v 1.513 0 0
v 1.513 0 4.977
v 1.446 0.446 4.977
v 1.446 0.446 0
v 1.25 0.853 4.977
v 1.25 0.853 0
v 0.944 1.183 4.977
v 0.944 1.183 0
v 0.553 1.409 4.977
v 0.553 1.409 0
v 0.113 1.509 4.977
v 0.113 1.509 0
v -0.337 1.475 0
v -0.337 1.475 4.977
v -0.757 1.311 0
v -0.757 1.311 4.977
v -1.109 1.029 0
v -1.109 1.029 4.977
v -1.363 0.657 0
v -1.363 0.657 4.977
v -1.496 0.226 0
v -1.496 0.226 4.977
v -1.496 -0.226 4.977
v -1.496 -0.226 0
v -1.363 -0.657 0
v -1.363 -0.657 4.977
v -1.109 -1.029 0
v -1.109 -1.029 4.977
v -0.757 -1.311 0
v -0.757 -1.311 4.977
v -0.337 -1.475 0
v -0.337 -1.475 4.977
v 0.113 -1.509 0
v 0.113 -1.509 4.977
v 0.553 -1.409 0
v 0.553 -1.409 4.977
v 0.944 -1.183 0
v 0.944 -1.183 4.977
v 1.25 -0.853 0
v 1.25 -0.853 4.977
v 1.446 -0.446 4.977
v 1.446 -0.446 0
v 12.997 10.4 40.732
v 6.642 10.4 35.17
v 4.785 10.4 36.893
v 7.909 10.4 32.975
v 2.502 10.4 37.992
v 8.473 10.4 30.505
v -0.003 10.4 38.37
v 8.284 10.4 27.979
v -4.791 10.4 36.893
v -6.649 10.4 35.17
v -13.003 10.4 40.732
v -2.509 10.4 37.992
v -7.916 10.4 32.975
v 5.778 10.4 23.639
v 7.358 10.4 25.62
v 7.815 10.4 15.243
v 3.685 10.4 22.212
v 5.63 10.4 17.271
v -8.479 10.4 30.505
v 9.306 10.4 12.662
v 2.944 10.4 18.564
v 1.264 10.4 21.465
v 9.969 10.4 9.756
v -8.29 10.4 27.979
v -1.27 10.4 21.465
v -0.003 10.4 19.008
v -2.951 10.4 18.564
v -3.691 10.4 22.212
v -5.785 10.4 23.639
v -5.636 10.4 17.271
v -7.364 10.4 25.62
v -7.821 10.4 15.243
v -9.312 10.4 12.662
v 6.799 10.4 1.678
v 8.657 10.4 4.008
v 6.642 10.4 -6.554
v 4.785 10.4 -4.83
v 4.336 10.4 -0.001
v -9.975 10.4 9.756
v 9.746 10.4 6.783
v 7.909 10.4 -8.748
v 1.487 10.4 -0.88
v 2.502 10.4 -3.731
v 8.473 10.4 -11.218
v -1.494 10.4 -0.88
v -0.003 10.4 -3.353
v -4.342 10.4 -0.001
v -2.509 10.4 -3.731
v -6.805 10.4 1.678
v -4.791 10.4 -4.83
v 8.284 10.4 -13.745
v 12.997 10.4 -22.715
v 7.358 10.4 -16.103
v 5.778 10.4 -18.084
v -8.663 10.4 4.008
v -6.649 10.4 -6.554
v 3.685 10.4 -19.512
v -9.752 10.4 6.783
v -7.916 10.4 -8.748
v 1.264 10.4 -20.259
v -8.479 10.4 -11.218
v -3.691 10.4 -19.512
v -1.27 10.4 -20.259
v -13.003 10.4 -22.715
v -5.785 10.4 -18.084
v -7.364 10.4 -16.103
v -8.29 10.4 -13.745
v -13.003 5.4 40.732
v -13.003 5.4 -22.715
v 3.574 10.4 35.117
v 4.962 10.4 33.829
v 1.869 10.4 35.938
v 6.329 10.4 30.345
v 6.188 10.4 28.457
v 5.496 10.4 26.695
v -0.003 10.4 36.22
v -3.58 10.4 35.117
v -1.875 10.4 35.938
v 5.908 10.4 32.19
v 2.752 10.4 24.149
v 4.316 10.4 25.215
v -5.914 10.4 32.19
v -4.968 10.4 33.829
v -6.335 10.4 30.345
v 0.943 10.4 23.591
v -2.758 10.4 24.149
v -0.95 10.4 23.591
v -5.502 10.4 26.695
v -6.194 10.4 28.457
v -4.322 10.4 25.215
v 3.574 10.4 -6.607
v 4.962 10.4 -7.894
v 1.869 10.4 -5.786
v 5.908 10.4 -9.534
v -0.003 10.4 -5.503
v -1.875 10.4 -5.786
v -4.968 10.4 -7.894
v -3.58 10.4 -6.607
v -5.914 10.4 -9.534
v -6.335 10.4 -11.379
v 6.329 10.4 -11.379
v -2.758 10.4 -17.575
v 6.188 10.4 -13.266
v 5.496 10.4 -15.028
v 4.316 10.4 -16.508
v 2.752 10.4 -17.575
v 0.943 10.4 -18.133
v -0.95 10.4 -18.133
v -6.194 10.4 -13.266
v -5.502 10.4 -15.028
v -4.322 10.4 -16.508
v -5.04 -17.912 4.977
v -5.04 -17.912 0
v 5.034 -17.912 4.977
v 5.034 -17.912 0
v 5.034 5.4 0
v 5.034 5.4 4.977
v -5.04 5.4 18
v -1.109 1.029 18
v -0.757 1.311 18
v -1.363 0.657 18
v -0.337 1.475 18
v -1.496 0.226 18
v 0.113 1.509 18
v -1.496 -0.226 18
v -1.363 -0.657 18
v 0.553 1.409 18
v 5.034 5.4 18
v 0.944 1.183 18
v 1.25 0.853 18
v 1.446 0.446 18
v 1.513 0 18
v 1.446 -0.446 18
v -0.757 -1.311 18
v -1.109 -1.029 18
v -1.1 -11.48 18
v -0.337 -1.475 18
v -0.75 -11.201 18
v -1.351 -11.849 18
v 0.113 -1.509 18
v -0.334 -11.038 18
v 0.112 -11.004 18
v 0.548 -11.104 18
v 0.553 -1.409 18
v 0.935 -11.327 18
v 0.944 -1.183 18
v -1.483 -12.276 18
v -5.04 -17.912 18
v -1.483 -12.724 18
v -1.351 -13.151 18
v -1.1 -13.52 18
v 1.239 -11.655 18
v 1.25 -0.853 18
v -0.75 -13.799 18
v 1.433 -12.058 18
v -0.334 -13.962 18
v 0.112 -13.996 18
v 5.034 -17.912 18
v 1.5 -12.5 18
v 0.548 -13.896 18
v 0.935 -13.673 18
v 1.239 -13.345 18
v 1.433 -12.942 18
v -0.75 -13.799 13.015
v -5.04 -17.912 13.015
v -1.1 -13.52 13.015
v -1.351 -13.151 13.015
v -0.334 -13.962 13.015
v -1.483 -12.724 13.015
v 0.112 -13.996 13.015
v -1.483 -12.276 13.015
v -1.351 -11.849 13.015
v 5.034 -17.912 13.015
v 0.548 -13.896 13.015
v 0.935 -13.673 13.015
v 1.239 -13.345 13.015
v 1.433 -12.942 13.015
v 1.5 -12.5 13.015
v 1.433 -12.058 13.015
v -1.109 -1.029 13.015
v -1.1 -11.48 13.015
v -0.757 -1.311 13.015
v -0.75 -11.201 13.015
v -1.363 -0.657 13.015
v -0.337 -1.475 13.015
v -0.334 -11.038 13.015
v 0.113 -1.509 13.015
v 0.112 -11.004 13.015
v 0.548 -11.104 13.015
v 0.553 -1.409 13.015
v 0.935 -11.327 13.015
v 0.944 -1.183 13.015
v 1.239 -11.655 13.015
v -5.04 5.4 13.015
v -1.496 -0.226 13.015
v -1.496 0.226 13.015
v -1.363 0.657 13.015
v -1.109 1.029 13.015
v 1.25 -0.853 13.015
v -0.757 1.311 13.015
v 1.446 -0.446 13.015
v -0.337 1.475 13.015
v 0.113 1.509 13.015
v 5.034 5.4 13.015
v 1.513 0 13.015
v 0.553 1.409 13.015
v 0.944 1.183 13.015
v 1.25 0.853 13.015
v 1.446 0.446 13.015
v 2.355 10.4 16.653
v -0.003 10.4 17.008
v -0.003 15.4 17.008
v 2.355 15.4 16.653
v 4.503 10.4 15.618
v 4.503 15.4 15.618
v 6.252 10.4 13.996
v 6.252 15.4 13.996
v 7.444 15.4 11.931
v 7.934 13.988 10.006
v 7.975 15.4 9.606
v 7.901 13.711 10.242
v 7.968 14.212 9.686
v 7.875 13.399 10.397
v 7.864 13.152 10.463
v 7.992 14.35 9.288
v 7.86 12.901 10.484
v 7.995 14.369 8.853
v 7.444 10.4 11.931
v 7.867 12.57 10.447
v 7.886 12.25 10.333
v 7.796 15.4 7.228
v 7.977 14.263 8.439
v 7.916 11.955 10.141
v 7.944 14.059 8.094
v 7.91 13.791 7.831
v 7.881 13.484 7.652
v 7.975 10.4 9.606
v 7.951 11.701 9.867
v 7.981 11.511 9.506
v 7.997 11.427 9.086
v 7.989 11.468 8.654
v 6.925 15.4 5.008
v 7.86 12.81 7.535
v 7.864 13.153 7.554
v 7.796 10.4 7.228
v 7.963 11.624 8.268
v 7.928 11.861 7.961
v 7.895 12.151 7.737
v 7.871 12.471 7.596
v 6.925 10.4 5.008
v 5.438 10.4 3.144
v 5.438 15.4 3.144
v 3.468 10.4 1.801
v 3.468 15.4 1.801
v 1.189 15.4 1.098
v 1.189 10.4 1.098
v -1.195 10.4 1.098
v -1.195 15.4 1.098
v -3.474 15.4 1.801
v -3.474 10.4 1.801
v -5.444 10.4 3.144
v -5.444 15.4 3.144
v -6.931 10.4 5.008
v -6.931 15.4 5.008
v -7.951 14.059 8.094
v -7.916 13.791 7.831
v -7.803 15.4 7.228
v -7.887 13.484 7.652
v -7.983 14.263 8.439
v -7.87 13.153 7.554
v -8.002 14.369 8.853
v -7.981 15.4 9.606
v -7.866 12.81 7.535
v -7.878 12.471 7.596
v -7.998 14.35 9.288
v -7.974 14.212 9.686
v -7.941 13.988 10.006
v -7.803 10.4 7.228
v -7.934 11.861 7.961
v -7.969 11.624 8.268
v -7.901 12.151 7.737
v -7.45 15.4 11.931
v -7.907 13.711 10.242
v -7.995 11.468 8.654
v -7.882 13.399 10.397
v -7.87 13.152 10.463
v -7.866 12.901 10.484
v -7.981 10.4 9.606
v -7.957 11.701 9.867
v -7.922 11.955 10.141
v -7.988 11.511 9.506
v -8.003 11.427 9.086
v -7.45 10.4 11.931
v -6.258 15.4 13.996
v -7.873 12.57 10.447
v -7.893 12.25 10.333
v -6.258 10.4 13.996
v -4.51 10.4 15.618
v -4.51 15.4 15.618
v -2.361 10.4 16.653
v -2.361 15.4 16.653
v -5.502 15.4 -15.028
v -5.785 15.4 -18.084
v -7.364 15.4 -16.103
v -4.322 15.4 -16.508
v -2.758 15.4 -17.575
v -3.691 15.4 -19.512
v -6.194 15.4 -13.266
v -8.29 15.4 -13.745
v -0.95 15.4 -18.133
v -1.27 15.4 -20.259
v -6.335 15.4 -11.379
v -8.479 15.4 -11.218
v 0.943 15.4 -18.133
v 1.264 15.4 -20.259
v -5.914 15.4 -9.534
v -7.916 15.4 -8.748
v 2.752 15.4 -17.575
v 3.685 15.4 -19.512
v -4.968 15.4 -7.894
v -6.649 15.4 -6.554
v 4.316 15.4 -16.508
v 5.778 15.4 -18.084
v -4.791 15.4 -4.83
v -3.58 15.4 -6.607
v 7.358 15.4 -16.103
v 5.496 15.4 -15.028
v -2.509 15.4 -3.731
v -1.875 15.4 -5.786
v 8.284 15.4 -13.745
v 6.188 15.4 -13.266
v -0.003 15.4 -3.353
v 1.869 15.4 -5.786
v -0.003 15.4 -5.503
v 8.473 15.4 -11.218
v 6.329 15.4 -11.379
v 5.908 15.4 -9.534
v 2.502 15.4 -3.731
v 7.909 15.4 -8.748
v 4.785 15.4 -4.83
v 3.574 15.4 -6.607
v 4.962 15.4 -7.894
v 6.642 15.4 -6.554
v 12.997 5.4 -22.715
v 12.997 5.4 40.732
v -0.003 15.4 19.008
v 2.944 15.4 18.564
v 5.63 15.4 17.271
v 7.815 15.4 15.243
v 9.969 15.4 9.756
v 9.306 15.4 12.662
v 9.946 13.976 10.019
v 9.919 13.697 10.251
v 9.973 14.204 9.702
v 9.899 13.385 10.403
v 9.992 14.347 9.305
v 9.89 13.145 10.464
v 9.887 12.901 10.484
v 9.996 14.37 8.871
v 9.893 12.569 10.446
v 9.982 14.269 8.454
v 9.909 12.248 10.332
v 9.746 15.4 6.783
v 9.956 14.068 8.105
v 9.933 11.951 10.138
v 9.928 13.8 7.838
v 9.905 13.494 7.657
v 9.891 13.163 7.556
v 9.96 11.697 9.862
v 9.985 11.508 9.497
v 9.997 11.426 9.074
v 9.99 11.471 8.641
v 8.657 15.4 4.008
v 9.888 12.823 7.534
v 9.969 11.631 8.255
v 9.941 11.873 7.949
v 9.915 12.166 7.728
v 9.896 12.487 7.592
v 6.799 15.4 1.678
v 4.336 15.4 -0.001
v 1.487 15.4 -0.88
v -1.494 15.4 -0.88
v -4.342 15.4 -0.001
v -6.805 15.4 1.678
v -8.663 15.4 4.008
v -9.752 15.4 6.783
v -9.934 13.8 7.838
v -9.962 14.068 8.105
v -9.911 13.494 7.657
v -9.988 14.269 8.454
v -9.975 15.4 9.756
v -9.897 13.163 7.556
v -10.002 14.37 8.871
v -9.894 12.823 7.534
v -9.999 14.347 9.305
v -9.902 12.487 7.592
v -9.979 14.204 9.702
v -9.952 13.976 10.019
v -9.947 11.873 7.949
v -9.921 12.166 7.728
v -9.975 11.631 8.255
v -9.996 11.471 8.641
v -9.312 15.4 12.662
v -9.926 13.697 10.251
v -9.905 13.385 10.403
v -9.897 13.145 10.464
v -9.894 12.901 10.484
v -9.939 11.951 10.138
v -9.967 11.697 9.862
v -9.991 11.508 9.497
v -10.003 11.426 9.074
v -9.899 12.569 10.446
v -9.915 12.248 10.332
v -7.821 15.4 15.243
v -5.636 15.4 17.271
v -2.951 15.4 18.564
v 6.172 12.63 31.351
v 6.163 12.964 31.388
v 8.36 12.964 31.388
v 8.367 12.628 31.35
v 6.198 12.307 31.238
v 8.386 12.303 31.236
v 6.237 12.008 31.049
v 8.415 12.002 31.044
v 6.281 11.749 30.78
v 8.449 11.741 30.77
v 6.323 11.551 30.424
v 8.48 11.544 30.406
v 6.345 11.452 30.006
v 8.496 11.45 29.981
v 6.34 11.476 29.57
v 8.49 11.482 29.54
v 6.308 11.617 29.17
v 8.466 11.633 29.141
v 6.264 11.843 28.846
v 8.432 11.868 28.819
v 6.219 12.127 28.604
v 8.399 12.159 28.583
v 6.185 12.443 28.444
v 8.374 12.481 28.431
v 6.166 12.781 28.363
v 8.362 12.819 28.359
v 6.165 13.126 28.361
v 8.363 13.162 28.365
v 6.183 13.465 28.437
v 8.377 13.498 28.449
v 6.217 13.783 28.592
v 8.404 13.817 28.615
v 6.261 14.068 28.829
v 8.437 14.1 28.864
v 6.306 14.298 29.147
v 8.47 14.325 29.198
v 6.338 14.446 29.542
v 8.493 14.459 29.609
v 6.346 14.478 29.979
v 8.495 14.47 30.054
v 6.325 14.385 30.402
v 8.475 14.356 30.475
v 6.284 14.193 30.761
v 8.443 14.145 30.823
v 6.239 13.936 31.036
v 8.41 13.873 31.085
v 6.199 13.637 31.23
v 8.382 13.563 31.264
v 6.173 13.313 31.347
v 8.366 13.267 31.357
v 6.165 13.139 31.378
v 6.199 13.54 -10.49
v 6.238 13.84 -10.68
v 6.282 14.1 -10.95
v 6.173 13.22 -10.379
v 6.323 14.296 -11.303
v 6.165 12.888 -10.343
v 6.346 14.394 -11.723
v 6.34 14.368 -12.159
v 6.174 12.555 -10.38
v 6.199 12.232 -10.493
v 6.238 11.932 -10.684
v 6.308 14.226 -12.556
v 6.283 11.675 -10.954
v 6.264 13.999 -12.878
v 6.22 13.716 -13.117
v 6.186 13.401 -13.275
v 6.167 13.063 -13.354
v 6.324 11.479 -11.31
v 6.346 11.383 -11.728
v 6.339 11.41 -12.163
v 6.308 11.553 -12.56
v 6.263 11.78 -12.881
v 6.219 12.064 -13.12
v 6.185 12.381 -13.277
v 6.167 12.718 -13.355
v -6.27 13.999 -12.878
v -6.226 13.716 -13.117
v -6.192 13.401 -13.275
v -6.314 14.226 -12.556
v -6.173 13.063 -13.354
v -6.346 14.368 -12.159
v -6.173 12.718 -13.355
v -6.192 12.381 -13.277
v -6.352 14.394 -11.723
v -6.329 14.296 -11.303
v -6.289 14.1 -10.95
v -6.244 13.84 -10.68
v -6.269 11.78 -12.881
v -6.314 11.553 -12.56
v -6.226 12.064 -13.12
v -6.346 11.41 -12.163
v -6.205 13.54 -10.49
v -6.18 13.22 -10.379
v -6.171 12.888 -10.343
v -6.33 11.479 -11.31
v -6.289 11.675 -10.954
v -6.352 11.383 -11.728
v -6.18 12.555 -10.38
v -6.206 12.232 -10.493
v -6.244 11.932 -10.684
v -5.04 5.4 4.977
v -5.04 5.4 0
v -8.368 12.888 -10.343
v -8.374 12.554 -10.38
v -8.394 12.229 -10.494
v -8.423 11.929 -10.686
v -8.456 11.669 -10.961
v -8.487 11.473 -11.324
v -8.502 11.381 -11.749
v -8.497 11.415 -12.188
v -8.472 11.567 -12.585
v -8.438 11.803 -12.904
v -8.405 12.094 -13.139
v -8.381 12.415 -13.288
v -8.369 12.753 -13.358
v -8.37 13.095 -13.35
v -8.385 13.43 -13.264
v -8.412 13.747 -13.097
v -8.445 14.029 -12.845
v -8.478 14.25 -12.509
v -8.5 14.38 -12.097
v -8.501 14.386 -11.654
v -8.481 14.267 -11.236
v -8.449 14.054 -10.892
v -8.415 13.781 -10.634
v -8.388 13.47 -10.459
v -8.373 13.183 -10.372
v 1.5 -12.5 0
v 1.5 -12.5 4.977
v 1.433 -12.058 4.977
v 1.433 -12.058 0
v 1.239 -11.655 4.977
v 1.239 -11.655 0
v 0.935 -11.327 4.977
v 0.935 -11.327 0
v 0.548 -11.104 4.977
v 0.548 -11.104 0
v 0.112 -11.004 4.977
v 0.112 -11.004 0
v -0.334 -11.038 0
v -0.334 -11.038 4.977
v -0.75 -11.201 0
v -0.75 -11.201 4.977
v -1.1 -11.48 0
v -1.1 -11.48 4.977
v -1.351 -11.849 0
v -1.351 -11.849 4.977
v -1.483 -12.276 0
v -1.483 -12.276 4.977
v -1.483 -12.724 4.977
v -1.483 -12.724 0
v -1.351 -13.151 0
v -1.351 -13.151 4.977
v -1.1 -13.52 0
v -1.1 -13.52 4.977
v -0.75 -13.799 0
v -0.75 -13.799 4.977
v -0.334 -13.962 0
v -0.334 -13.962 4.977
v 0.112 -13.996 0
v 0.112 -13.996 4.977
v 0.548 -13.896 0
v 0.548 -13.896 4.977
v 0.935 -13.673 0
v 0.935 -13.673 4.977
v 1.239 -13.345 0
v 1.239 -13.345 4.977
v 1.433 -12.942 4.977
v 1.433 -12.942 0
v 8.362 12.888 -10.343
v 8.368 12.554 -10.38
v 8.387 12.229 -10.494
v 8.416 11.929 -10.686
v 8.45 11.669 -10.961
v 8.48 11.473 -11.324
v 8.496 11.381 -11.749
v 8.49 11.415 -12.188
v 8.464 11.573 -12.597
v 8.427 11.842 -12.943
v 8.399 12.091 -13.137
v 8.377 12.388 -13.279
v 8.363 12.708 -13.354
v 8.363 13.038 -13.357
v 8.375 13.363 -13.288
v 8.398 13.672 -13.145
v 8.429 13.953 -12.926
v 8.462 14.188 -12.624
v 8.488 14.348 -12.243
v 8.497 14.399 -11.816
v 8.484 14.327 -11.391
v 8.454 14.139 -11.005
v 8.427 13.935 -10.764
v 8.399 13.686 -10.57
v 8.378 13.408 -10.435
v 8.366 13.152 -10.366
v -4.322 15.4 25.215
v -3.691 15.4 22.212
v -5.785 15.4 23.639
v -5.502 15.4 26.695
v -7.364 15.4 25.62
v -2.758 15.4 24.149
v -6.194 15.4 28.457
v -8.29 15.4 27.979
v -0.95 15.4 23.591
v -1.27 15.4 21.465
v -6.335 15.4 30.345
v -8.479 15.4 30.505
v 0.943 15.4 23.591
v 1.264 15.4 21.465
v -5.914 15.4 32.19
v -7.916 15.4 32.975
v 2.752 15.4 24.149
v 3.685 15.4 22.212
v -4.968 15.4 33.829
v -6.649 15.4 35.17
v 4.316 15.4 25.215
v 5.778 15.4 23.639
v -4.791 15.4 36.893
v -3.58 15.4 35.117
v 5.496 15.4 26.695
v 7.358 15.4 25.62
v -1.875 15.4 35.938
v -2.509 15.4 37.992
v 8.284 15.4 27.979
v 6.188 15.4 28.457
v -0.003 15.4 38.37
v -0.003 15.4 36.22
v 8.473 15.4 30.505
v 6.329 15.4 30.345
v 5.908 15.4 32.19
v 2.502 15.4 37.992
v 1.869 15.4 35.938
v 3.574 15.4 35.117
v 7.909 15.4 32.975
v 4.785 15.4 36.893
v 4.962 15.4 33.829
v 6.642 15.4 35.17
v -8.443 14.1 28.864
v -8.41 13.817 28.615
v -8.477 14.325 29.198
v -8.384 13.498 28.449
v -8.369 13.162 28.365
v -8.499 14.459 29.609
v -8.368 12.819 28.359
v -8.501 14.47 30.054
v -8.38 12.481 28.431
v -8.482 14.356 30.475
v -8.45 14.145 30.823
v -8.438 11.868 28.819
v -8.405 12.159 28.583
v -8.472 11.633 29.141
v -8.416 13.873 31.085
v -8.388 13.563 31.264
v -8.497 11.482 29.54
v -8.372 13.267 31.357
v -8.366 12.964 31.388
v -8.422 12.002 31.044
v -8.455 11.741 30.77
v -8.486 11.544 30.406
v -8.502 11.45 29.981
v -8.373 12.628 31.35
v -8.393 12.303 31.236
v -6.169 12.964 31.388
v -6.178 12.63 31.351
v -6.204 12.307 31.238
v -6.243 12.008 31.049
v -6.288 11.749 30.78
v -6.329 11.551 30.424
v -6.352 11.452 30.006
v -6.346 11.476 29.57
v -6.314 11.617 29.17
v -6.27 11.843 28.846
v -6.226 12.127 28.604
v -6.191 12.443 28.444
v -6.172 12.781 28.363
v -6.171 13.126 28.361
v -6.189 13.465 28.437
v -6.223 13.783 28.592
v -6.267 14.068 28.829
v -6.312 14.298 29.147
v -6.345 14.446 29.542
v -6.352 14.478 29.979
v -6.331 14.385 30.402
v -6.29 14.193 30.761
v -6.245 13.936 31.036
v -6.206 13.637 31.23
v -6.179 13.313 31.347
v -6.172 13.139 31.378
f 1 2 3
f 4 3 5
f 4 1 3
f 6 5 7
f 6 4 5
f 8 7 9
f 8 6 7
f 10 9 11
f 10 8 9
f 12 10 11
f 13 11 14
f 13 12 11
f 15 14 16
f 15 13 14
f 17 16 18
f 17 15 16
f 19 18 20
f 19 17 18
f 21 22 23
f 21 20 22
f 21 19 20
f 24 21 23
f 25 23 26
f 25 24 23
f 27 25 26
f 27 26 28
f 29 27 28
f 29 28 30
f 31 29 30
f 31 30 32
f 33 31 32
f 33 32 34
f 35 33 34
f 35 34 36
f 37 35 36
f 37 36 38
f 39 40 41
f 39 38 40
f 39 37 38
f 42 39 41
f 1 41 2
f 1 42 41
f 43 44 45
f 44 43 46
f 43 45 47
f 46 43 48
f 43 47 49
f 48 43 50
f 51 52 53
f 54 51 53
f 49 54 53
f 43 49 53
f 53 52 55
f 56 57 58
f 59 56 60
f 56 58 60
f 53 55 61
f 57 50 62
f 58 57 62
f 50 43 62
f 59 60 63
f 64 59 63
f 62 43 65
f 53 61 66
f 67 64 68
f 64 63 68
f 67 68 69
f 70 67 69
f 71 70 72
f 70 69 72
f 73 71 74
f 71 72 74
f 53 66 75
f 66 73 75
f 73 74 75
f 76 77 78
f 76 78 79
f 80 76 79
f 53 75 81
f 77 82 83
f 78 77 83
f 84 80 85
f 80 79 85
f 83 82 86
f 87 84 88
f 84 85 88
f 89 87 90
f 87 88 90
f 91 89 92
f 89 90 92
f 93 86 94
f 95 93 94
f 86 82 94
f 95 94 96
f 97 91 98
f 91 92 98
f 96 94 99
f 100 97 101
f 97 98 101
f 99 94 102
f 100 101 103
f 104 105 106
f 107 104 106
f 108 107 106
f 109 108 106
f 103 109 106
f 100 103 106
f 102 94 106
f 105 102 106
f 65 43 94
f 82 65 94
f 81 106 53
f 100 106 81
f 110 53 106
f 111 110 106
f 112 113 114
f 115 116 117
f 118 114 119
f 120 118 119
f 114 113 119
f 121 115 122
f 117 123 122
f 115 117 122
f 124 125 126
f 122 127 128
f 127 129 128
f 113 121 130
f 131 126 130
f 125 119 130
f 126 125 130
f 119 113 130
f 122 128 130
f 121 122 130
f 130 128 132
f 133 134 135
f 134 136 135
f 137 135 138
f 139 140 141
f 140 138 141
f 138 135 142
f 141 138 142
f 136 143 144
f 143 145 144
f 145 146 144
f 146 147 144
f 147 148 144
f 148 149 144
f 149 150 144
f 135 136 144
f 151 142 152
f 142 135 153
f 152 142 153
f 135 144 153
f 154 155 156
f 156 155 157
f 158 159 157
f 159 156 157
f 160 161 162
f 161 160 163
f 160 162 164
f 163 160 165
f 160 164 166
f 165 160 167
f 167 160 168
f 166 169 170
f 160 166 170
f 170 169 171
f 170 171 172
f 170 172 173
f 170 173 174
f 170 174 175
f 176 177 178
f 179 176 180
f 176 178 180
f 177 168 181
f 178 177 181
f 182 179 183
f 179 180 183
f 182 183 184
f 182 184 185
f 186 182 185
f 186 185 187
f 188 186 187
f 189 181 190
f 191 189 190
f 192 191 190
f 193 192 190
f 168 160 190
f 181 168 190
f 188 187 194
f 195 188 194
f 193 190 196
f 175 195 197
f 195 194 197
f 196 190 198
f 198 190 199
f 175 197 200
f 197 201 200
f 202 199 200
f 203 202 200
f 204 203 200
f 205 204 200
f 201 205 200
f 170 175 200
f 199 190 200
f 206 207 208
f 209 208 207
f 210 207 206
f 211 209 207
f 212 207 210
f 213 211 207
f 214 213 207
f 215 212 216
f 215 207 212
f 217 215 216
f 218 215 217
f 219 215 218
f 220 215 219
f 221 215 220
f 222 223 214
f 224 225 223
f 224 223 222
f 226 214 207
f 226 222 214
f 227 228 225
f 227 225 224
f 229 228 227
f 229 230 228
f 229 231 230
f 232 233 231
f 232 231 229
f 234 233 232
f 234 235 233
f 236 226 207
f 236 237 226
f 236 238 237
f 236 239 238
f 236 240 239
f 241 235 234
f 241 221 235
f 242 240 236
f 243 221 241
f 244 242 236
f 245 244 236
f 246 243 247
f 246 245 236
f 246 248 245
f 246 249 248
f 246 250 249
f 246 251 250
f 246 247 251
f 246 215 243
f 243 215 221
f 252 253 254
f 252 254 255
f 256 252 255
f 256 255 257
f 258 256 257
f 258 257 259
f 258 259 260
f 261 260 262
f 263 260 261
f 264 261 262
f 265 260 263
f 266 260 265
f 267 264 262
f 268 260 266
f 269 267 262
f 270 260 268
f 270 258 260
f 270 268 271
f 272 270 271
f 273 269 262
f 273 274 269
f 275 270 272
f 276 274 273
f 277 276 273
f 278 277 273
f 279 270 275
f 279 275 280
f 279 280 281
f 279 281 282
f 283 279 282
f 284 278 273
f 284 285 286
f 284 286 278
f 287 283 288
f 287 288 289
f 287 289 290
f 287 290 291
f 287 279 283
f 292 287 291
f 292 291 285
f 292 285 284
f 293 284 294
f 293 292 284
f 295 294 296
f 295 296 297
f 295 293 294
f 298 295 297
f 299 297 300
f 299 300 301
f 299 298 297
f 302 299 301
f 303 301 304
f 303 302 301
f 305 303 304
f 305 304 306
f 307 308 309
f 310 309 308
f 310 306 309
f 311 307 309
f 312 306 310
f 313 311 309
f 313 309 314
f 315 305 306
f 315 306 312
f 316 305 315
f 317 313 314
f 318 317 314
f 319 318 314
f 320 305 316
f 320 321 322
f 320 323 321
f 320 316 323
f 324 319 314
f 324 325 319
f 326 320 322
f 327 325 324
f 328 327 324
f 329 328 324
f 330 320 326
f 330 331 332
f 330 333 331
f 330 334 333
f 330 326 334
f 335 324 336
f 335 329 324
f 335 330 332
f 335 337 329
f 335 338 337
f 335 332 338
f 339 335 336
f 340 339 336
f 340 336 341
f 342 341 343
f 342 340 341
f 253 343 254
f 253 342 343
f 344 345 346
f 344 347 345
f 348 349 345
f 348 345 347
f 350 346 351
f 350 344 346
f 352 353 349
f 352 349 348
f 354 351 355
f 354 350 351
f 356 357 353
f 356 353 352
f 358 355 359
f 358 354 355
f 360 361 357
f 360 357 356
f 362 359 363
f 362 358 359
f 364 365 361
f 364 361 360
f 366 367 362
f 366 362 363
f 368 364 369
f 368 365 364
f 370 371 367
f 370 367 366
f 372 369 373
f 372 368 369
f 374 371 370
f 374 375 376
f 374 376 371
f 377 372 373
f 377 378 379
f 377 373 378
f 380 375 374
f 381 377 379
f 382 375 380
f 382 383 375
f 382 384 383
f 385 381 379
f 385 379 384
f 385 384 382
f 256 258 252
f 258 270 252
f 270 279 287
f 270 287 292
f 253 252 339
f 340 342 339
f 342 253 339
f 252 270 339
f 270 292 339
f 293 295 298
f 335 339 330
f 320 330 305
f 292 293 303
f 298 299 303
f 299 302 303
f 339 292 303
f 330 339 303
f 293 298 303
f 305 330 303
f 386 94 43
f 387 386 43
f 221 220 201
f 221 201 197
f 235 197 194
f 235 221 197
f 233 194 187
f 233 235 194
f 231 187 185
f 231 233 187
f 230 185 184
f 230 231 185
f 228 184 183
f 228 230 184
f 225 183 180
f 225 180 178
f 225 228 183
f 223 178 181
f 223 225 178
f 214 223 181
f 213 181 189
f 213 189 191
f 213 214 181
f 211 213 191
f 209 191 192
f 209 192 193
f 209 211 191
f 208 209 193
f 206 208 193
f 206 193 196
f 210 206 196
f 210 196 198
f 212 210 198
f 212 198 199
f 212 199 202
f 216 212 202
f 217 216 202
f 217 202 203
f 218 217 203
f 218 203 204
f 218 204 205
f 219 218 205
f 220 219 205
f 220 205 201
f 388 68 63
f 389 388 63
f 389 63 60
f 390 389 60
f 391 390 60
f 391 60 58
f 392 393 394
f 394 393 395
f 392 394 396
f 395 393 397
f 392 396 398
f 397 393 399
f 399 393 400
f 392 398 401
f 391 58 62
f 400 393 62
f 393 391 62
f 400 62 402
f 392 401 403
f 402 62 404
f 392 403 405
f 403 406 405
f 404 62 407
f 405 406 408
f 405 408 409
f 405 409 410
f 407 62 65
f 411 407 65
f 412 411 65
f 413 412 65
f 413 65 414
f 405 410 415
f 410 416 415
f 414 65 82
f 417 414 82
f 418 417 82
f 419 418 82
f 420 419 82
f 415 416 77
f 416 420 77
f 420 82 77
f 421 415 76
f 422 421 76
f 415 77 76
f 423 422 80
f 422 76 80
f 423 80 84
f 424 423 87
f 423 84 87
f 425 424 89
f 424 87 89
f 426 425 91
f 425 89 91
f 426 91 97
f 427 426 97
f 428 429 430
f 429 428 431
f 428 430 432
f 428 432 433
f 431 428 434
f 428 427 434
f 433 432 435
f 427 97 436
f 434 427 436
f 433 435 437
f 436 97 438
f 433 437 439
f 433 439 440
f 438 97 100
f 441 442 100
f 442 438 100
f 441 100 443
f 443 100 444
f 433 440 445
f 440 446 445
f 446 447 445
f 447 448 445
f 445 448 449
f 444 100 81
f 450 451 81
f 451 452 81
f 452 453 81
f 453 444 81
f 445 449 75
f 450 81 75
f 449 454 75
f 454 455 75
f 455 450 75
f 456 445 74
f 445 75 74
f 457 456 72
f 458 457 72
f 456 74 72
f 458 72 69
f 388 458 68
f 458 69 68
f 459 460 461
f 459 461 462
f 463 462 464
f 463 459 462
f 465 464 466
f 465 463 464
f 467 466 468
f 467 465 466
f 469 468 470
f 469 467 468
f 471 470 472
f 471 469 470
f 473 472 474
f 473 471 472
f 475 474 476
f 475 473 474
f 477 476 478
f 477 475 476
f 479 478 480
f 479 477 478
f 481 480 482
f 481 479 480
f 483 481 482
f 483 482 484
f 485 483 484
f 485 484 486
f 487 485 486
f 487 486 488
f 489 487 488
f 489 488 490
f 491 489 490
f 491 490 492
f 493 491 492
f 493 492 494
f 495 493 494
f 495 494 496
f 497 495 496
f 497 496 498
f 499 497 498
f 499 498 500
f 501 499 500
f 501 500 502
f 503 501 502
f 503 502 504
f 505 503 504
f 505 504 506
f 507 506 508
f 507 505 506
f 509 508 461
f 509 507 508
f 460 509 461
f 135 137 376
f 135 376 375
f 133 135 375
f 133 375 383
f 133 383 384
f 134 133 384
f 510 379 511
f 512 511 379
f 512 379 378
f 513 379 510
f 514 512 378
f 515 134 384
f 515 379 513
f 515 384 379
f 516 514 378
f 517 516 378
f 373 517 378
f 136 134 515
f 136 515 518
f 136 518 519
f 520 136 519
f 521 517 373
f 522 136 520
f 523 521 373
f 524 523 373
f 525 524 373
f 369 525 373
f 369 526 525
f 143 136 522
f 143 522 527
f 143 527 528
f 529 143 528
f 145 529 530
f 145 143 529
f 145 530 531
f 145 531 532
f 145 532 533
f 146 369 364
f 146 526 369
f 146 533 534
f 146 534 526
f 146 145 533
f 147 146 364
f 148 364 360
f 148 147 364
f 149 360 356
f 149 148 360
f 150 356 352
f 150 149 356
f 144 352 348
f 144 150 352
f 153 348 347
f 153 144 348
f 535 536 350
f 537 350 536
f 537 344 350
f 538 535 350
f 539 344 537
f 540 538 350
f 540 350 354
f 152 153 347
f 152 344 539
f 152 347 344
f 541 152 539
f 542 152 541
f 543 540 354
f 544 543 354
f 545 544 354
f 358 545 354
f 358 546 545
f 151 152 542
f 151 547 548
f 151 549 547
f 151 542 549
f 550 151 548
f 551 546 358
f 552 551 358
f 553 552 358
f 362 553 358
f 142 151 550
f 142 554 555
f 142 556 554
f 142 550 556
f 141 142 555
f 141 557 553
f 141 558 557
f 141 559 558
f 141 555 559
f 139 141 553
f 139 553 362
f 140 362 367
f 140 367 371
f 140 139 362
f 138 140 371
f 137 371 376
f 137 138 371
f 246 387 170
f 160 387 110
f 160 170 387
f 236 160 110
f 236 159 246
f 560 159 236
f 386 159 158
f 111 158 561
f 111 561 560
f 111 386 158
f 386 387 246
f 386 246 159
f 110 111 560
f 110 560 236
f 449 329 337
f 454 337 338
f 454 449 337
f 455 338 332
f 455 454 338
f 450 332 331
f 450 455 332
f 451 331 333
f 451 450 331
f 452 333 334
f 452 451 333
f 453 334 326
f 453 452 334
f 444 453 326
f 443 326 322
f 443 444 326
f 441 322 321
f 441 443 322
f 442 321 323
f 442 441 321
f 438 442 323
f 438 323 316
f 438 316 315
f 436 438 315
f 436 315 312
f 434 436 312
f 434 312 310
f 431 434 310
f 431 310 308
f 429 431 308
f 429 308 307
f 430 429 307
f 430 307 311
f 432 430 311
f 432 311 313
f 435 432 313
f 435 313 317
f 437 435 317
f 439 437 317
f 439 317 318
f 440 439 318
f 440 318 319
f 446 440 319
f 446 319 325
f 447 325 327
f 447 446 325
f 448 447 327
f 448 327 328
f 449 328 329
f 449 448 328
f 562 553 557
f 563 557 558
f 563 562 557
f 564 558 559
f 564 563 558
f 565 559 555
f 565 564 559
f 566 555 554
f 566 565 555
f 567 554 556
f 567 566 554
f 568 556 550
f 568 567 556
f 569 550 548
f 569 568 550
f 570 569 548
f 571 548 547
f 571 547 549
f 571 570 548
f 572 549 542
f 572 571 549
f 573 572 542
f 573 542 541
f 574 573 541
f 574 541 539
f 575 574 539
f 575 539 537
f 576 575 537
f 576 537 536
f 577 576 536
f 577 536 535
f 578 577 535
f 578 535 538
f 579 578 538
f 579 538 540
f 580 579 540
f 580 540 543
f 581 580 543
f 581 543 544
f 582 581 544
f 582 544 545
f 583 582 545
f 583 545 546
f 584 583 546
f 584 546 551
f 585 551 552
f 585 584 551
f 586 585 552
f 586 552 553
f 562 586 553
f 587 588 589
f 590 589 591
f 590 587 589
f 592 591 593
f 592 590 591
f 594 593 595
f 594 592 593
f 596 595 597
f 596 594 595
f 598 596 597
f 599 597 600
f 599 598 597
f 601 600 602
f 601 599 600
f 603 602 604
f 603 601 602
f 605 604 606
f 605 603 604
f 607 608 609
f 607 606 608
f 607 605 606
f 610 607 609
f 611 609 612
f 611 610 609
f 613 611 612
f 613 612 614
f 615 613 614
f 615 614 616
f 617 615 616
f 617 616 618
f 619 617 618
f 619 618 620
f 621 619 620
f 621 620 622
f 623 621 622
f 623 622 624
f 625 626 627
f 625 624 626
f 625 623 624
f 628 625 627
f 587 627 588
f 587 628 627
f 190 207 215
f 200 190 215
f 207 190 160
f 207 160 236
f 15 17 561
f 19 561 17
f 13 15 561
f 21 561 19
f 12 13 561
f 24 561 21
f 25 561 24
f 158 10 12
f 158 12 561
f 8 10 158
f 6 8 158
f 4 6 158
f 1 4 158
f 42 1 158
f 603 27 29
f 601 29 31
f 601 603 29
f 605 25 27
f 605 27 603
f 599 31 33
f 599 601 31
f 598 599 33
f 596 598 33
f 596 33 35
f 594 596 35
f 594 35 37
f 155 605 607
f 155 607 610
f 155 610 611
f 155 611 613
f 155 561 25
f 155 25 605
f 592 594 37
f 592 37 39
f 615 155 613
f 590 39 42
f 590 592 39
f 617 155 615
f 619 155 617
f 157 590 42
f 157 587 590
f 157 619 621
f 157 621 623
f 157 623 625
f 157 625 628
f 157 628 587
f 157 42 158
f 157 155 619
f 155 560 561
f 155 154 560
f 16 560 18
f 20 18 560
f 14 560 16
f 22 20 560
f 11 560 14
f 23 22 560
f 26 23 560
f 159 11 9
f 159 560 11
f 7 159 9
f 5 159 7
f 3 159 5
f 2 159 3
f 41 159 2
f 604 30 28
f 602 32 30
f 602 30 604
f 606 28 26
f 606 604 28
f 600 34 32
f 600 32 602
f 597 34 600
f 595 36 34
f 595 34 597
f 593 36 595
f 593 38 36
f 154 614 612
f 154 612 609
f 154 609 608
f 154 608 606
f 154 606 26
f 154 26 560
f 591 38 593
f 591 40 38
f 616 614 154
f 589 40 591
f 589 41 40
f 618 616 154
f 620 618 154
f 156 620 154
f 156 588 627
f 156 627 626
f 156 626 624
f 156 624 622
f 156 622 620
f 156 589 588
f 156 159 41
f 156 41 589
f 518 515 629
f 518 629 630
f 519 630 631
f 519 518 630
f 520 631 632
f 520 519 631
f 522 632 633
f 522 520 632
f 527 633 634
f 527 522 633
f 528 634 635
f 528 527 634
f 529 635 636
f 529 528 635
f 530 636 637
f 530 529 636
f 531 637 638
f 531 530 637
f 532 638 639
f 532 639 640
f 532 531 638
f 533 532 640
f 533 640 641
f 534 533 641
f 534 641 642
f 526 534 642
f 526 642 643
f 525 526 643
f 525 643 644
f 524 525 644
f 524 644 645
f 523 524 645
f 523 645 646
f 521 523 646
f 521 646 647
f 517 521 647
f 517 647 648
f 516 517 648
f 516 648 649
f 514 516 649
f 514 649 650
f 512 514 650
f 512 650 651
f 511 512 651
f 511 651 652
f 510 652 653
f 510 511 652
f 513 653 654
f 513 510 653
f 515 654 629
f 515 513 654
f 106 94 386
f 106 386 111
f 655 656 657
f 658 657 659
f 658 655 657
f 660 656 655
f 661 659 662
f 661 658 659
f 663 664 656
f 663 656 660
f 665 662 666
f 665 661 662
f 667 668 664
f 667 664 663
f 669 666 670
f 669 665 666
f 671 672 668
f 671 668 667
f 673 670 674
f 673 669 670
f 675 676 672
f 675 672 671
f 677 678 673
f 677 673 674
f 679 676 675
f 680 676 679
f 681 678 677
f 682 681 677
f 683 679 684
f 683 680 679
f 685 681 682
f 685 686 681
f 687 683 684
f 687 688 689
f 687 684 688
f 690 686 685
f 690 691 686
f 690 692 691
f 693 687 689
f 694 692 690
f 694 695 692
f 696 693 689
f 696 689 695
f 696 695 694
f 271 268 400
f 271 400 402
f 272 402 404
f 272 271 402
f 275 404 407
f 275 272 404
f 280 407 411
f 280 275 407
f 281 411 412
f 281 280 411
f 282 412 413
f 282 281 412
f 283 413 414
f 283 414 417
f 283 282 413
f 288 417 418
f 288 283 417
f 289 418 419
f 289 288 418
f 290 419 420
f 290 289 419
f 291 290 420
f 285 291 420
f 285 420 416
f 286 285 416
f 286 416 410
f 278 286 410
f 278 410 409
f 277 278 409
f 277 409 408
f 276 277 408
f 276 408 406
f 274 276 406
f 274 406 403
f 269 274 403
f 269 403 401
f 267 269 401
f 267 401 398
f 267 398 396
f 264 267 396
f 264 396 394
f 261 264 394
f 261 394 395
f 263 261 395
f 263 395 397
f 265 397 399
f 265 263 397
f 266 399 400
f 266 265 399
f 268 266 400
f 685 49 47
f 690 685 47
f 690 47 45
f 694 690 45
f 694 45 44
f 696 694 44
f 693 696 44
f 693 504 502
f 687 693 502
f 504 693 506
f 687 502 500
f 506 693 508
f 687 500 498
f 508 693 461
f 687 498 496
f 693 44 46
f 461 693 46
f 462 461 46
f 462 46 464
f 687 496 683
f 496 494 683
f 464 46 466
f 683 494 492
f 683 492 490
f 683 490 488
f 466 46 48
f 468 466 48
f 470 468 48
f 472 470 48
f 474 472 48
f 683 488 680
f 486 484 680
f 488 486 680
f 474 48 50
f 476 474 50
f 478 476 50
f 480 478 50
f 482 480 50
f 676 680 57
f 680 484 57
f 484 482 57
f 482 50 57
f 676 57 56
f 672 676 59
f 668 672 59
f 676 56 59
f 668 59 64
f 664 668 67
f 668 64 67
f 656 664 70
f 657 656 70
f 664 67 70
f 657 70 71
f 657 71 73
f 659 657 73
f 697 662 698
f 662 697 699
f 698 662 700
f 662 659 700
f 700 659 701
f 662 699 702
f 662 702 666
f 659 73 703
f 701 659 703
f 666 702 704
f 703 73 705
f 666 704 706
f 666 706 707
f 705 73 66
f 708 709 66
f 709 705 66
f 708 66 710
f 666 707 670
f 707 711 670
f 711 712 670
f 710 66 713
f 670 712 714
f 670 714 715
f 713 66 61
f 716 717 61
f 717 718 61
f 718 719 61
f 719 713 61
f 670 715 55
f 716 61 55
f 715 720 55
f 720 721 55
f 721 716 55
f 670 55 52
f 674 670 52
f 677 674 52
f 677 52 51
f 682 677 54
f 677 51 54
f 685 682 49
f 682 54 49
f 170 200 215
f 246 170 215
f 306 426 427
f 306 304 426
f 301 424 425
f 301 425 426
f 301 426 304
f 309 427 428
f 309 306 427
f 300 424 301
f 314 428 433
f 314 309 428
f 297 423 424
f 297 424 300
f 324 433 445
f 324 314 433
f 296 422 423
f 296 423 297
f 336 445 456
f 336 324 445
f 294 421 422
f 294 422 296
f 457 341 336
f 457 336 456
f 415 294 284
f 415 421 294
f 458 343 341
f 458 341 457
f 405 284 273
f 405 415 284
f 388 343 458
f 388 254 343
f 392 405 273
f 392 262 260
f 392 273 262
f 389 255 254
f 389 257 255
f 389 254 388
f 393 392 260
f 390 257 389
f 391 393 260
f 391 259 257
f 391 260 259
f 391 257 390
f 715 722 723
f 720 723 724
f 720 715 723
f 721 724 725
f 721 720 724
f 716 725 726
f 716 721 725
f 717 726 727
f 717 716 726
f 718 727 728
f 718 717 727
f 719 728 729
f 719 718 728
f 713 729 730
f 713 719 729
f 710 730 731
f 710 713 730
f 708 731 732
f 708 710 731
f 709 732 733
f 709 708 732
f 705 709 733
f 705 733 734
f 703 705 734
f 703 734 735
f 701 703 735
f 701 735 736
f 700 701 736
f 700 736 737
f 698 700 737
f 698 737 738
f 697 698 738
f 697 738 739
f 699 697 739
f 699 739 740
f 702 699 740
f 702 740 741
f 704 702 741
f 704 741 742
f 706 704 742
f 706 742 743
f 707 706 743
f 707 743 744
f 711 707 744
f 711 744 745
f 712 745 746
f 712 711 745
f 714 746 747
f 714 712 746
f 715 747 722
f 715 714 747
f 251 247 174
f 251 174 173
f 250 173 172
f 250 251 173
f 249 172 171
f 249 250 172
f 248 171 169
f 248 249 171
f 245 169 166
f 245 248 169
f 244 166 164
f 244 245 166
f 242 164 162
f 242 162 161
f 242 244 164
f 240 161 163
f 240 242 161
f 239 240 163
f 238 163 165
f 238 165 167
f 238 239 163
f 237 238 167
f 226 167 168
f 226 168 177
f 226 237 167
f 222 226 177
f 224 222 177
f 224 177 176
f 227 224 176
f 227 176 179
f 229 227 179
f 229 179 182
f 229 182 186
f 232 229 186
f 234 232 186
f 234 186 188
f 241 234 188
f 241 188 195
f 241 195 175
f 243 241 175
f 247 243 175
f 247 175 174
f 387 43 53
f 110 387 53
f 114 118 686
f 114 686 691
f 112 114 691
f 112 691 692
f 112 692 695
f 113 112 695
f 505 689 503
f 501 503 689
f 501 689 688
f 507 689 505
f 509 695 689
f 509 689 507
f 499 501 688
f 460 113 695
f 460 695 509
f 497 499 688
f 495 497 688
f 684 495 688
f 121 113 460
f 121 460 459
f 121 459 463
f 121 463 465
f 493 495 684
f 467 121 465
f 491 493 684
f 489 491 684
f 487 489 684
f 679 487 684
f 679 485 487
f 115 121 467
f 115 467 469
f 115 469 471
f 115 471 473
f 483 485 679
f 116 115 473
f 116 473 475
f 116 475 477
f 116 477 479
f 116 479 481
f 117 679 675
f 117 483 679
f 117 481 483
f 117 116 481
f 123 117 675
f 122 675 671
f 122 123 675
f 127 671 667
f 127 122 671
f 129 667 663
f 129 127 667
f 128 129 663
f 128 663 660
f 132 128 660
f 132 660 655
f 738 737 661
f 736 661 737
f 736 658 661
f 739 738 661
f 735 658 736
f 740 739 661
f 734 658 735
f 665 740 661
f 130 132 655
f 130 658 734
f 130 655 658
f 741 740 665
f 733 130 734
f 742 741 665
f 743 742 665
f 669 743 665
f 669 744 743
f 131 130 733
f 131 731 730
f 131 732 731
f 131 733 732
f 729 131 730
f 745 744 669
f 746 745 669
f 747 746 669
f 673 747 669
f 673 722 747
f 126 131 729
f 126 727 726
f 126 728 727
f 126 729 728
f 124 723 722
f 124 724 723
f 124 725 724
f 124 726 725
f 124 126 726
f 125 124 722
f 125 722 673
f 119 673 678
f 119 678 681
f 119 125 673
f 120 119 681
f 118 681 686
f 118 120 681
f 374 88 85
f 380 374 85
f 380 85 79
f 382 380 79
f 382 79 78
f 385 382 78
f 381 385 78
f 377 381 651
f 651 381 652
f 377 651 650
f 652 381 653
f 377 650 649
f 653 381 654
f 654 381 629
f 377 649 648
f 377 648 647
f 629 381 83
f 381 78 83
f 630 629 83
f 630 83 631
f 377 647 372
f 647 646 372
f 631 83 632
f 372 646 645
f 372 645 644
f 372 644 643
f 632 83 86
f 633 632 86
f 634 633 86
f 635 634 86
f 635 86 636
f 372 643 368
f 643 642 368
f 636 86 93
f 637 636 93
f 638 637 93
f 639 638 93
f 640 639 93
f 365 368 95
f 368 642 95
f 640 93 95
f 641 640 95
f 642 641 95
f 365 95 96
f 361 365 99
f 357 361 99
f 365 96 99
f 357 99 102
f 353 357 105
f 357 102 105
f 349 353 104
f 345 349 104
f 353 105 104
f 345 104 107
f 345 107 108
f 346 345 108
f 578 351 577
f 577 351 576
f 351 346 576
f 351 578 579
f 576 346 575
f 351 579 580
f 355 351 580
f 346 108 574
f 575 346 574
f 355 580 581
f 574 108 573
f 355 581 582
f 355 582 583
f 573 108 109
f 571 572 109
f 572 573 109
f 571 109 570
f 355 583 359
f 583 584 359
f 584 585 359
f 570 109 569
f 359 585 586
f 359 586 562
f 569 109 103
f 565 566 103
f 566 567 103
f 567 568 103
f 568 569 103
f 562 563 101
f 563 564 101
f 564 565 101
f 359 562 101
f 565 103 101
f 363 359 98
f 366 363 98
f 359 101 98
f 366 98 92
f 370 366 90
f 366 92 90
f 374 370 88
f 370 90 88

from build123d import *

# Parameters (mm, degrees)
CROQUIS1_W                 = 10.074318824
CROQUIS1_H                 = 23.311592876
CROQUIS1_R                 = 1.513350195
CROQUIS1_R_2               = 1.5
SALIENTE_EXTRUIR1_DEPTH    = 18
CROQUIS2_W                 = 10.074318824
CROQUIS2_H                 = 18
SALIENTE_EXTRUIR2_DEPTH    = 5
CORTAR_EXTRUIR1_DEPTH      = 22
SALIENTE_EXTRUIR3_DEPTH    = 5
CROQUIS5_R                 = 10
CROQUIS5_R_2               = 8
SALIENTE_EXTRUIR4_DEPTH    = 5
CORTAR_EXTRUIR3_DEPTH      = 33
CORTAR_EXTRUIR3_DEPTH_BACK = 14
CROQUIS7_R                 = 1.475964283
CROQUIS11_R                = 8.5
CROQUIS11_R_2              = 6.35
SALIENTE_EXTRUIR6_DEPTH    = 5
CROQUIS12_R                = 8.5
CROQUIS12_R_2              = 6.35
SALIENTE_EXTRUIR8_DEPTH    = 5
CORTAR_EXTRUIR4_DEPTH      = 22
CORTAR_EXTRUIR4_DEPTH_BACK = 14
CROQUIS13_R                = 1.510922734
CORTAR_EXTRUIR5_DEPTH      = 25
CORTAR_EXTRUIR5_DEPTH_BACK = 24
CROQUIS14_R                = 1.5177653


with BuildPart() as part:
    # Croquis1 → Saliente-Extruir1 (new body)
    with BuildSketch(Plane.XY):
        with Locations((-0.003103843, -6.255796438)):
            Rectangle(CROQUIS1_W, CROQUIS1_H)
        Circle(CROQUIS1_R, mode=Mode.SUBTRACT)
        with Locations((0, -12.5)):
            Circle(CROQUIS1_R_2, mode=Mode.SUBTRACT)
    extrude(amount=SALIENTE_EXTRUIR1_DEPTH)

    # Croquis2 → Saliente-Extruir2 (add)
    with BuildSketch(Plane(origin=(0, 5.4, 0), x_dir=(1, 0, 0), z_dir=(0, 1, 0))):
        with Locations((-0.003103843, -9)):
            Rectangle(CROQUIS2_W, CROQUIS2_H)
    extrude(amount=SALIENTE_EXTRUIR2_DEPTH)

    # Croquis3 → Cortar-Extruir1 (cut)
    with BuildSketch(Plane(origin=(5.034055569, 0, 0), x_dir=(0, 0, -1), z_dir=(1, 0, 0))):
        Polygon((-9, -17.911592876), (-13.015052671, -17.911592876), (-13.015052671, 5.408457803), (-4.97666887, 5.408457803), (-4.97666887, -17.911592876), align=None)
    extrude(amount=-CORTAR_EXTRUIR1_DEPTH, mode=Mode.SUBTRACT)

    # Croquis4 → Saliente-Extruir3 (add)
    with BuildSketch(Plane(origin=(0, 10.4, 0), x_dir=(1, 0, 0), z_dir=(0, 1, 0))):
        Polygon((-0.003103843, 22.715254114), (12.996896157, 22.715254114), (12.996896157, -40.731801261), (-13.003103843, -40.731801261), (-13.003103843, 22.715254114), align=None)
    extrude(amount=-SALIENTE_EXTRUIR3_DEPTH)

    # Croquis5 → Saliente-Extruir4 (add)
    with BuildSketch(Plane(origin=(0, 10.4, 0), x_dir=(1, 0, 0), z_dir=(0, 1, 0))):
        with Locations(Location((-0.003103843, -9.008273573, 0), (0, 0, 270))):
            Circle(CROQUIS5_R)
        with Locations(Location((-0.003103843, -9.008273573, 0), (0, 0, 270))):
            Circle(CROQUIS5_R_2, mode=Mode.SUBTRACT)
    extrude(amount=SALIENTE_EXTRUIR4_DEPTH)

    # Croquis7 → Cortar-Extruir3 (cut, two sides: drawn at the far end of the back side and taken through both)
    with BuildSketch(Plane(origin=(0, 0, 0), x_dir=(0, 0, -1), z_dir=(1, 0, 0)).offset(-CORTAR_EXTRUIR3_DEPTH_BACK)):
        with Locations(Location((-9.008273573, 12.900838069, 0), (0, 0, 180))):
            Circle(CROQUIS7_R)
    extrude(amount=CORTAR_EXTRUIR3_DEPTH + CORTAR_EXTRUIR3_DEPTH_BACK, mode=Mode.SUBTRACT)

    # Croquis11 → Saliente-Extruir6 (add)
    with BuildSketch(Plane(origin=(0, 10.4, 0), x_dir=(1, 0, 0), z_dir=(0, 1, 0))):
        with Locations(Location((-0.003103843, 11.85349027, 0), (0, 0, 270))):
            Circle(CROQUIS11_R)
        with Locations(Location((-0.003103843, 11.85349027, 0), (0, 0, 270))):
            Circle(CROQUIS11_R_2, mode=Mode.SUBTRACT)
    extrude(amount=SALIENTE_EXTRUIR6_DEPTH)

    # Croquis12 → Saliente-Extruir8 (add)
    with BuildSketch(Plane(origin=(0, 10.4, 0), x_dir=(1, 0, 0), z_dir=(0, 1, 0))):
        with Locations(Location((-0.003103843, -29.870037417, 0), (0, 0, 270))):
            Circle(CROQUIS12_R)
        with Locations(Location((-0.003103843, -29.870037417, 0), (0, 0, 270))):
            Circle(CROQUIS12_R_2, mode=Mode.SUBTRACT)
    extrude(amount=SALIENTE_EXTRUIR8_DEPTH)

    # Croquis13 → Cortar-Extruir4 (cut, two sides: drawn at the far end of the back side and taken through both)
    with BuildSketch(Plane(origin=(0, 0, 0), x_dir=(0, 0, -1), z_dir=(1, 0, 0)).offset(-CORTAR_EXTRUIR4_DEPTH_BACK)):
        with Locations(Location((11.85349027, 12.8884556, 0), (0, 0, 180))):
            Circle(CROQUIS13_R)
    extrude(amount=CORTAR_EXTRUIR4_DEPTH + CORTAR_EXTRUIR4_DEPTH_BACK, mode=Mode.SUBTRACT)

    # Croquis14 → Cortar-Extruir5 (cut, two sides: drawn at the far end of the back side and taken through both)
    with BuildSketch(Plane(origin=(0, 0, 0), x_dir=(0, 0, -1), z_dir=(1, 0, 0)).offset(-CORTAR_EXTRUIR5_DEPTH_BACK)):
        with Locations(Location((-29.870037417, 12.963711877, 0), (0, 0, 180))):
            Circle(CROQUIS14_R)
    extrude(amount=CORTAR_EXTRUIR5_DEPTH + CORTAR_EXTRUIR5_DEPTH_BACK, mode=Mode.SUBTRACT)


solid = part.part
